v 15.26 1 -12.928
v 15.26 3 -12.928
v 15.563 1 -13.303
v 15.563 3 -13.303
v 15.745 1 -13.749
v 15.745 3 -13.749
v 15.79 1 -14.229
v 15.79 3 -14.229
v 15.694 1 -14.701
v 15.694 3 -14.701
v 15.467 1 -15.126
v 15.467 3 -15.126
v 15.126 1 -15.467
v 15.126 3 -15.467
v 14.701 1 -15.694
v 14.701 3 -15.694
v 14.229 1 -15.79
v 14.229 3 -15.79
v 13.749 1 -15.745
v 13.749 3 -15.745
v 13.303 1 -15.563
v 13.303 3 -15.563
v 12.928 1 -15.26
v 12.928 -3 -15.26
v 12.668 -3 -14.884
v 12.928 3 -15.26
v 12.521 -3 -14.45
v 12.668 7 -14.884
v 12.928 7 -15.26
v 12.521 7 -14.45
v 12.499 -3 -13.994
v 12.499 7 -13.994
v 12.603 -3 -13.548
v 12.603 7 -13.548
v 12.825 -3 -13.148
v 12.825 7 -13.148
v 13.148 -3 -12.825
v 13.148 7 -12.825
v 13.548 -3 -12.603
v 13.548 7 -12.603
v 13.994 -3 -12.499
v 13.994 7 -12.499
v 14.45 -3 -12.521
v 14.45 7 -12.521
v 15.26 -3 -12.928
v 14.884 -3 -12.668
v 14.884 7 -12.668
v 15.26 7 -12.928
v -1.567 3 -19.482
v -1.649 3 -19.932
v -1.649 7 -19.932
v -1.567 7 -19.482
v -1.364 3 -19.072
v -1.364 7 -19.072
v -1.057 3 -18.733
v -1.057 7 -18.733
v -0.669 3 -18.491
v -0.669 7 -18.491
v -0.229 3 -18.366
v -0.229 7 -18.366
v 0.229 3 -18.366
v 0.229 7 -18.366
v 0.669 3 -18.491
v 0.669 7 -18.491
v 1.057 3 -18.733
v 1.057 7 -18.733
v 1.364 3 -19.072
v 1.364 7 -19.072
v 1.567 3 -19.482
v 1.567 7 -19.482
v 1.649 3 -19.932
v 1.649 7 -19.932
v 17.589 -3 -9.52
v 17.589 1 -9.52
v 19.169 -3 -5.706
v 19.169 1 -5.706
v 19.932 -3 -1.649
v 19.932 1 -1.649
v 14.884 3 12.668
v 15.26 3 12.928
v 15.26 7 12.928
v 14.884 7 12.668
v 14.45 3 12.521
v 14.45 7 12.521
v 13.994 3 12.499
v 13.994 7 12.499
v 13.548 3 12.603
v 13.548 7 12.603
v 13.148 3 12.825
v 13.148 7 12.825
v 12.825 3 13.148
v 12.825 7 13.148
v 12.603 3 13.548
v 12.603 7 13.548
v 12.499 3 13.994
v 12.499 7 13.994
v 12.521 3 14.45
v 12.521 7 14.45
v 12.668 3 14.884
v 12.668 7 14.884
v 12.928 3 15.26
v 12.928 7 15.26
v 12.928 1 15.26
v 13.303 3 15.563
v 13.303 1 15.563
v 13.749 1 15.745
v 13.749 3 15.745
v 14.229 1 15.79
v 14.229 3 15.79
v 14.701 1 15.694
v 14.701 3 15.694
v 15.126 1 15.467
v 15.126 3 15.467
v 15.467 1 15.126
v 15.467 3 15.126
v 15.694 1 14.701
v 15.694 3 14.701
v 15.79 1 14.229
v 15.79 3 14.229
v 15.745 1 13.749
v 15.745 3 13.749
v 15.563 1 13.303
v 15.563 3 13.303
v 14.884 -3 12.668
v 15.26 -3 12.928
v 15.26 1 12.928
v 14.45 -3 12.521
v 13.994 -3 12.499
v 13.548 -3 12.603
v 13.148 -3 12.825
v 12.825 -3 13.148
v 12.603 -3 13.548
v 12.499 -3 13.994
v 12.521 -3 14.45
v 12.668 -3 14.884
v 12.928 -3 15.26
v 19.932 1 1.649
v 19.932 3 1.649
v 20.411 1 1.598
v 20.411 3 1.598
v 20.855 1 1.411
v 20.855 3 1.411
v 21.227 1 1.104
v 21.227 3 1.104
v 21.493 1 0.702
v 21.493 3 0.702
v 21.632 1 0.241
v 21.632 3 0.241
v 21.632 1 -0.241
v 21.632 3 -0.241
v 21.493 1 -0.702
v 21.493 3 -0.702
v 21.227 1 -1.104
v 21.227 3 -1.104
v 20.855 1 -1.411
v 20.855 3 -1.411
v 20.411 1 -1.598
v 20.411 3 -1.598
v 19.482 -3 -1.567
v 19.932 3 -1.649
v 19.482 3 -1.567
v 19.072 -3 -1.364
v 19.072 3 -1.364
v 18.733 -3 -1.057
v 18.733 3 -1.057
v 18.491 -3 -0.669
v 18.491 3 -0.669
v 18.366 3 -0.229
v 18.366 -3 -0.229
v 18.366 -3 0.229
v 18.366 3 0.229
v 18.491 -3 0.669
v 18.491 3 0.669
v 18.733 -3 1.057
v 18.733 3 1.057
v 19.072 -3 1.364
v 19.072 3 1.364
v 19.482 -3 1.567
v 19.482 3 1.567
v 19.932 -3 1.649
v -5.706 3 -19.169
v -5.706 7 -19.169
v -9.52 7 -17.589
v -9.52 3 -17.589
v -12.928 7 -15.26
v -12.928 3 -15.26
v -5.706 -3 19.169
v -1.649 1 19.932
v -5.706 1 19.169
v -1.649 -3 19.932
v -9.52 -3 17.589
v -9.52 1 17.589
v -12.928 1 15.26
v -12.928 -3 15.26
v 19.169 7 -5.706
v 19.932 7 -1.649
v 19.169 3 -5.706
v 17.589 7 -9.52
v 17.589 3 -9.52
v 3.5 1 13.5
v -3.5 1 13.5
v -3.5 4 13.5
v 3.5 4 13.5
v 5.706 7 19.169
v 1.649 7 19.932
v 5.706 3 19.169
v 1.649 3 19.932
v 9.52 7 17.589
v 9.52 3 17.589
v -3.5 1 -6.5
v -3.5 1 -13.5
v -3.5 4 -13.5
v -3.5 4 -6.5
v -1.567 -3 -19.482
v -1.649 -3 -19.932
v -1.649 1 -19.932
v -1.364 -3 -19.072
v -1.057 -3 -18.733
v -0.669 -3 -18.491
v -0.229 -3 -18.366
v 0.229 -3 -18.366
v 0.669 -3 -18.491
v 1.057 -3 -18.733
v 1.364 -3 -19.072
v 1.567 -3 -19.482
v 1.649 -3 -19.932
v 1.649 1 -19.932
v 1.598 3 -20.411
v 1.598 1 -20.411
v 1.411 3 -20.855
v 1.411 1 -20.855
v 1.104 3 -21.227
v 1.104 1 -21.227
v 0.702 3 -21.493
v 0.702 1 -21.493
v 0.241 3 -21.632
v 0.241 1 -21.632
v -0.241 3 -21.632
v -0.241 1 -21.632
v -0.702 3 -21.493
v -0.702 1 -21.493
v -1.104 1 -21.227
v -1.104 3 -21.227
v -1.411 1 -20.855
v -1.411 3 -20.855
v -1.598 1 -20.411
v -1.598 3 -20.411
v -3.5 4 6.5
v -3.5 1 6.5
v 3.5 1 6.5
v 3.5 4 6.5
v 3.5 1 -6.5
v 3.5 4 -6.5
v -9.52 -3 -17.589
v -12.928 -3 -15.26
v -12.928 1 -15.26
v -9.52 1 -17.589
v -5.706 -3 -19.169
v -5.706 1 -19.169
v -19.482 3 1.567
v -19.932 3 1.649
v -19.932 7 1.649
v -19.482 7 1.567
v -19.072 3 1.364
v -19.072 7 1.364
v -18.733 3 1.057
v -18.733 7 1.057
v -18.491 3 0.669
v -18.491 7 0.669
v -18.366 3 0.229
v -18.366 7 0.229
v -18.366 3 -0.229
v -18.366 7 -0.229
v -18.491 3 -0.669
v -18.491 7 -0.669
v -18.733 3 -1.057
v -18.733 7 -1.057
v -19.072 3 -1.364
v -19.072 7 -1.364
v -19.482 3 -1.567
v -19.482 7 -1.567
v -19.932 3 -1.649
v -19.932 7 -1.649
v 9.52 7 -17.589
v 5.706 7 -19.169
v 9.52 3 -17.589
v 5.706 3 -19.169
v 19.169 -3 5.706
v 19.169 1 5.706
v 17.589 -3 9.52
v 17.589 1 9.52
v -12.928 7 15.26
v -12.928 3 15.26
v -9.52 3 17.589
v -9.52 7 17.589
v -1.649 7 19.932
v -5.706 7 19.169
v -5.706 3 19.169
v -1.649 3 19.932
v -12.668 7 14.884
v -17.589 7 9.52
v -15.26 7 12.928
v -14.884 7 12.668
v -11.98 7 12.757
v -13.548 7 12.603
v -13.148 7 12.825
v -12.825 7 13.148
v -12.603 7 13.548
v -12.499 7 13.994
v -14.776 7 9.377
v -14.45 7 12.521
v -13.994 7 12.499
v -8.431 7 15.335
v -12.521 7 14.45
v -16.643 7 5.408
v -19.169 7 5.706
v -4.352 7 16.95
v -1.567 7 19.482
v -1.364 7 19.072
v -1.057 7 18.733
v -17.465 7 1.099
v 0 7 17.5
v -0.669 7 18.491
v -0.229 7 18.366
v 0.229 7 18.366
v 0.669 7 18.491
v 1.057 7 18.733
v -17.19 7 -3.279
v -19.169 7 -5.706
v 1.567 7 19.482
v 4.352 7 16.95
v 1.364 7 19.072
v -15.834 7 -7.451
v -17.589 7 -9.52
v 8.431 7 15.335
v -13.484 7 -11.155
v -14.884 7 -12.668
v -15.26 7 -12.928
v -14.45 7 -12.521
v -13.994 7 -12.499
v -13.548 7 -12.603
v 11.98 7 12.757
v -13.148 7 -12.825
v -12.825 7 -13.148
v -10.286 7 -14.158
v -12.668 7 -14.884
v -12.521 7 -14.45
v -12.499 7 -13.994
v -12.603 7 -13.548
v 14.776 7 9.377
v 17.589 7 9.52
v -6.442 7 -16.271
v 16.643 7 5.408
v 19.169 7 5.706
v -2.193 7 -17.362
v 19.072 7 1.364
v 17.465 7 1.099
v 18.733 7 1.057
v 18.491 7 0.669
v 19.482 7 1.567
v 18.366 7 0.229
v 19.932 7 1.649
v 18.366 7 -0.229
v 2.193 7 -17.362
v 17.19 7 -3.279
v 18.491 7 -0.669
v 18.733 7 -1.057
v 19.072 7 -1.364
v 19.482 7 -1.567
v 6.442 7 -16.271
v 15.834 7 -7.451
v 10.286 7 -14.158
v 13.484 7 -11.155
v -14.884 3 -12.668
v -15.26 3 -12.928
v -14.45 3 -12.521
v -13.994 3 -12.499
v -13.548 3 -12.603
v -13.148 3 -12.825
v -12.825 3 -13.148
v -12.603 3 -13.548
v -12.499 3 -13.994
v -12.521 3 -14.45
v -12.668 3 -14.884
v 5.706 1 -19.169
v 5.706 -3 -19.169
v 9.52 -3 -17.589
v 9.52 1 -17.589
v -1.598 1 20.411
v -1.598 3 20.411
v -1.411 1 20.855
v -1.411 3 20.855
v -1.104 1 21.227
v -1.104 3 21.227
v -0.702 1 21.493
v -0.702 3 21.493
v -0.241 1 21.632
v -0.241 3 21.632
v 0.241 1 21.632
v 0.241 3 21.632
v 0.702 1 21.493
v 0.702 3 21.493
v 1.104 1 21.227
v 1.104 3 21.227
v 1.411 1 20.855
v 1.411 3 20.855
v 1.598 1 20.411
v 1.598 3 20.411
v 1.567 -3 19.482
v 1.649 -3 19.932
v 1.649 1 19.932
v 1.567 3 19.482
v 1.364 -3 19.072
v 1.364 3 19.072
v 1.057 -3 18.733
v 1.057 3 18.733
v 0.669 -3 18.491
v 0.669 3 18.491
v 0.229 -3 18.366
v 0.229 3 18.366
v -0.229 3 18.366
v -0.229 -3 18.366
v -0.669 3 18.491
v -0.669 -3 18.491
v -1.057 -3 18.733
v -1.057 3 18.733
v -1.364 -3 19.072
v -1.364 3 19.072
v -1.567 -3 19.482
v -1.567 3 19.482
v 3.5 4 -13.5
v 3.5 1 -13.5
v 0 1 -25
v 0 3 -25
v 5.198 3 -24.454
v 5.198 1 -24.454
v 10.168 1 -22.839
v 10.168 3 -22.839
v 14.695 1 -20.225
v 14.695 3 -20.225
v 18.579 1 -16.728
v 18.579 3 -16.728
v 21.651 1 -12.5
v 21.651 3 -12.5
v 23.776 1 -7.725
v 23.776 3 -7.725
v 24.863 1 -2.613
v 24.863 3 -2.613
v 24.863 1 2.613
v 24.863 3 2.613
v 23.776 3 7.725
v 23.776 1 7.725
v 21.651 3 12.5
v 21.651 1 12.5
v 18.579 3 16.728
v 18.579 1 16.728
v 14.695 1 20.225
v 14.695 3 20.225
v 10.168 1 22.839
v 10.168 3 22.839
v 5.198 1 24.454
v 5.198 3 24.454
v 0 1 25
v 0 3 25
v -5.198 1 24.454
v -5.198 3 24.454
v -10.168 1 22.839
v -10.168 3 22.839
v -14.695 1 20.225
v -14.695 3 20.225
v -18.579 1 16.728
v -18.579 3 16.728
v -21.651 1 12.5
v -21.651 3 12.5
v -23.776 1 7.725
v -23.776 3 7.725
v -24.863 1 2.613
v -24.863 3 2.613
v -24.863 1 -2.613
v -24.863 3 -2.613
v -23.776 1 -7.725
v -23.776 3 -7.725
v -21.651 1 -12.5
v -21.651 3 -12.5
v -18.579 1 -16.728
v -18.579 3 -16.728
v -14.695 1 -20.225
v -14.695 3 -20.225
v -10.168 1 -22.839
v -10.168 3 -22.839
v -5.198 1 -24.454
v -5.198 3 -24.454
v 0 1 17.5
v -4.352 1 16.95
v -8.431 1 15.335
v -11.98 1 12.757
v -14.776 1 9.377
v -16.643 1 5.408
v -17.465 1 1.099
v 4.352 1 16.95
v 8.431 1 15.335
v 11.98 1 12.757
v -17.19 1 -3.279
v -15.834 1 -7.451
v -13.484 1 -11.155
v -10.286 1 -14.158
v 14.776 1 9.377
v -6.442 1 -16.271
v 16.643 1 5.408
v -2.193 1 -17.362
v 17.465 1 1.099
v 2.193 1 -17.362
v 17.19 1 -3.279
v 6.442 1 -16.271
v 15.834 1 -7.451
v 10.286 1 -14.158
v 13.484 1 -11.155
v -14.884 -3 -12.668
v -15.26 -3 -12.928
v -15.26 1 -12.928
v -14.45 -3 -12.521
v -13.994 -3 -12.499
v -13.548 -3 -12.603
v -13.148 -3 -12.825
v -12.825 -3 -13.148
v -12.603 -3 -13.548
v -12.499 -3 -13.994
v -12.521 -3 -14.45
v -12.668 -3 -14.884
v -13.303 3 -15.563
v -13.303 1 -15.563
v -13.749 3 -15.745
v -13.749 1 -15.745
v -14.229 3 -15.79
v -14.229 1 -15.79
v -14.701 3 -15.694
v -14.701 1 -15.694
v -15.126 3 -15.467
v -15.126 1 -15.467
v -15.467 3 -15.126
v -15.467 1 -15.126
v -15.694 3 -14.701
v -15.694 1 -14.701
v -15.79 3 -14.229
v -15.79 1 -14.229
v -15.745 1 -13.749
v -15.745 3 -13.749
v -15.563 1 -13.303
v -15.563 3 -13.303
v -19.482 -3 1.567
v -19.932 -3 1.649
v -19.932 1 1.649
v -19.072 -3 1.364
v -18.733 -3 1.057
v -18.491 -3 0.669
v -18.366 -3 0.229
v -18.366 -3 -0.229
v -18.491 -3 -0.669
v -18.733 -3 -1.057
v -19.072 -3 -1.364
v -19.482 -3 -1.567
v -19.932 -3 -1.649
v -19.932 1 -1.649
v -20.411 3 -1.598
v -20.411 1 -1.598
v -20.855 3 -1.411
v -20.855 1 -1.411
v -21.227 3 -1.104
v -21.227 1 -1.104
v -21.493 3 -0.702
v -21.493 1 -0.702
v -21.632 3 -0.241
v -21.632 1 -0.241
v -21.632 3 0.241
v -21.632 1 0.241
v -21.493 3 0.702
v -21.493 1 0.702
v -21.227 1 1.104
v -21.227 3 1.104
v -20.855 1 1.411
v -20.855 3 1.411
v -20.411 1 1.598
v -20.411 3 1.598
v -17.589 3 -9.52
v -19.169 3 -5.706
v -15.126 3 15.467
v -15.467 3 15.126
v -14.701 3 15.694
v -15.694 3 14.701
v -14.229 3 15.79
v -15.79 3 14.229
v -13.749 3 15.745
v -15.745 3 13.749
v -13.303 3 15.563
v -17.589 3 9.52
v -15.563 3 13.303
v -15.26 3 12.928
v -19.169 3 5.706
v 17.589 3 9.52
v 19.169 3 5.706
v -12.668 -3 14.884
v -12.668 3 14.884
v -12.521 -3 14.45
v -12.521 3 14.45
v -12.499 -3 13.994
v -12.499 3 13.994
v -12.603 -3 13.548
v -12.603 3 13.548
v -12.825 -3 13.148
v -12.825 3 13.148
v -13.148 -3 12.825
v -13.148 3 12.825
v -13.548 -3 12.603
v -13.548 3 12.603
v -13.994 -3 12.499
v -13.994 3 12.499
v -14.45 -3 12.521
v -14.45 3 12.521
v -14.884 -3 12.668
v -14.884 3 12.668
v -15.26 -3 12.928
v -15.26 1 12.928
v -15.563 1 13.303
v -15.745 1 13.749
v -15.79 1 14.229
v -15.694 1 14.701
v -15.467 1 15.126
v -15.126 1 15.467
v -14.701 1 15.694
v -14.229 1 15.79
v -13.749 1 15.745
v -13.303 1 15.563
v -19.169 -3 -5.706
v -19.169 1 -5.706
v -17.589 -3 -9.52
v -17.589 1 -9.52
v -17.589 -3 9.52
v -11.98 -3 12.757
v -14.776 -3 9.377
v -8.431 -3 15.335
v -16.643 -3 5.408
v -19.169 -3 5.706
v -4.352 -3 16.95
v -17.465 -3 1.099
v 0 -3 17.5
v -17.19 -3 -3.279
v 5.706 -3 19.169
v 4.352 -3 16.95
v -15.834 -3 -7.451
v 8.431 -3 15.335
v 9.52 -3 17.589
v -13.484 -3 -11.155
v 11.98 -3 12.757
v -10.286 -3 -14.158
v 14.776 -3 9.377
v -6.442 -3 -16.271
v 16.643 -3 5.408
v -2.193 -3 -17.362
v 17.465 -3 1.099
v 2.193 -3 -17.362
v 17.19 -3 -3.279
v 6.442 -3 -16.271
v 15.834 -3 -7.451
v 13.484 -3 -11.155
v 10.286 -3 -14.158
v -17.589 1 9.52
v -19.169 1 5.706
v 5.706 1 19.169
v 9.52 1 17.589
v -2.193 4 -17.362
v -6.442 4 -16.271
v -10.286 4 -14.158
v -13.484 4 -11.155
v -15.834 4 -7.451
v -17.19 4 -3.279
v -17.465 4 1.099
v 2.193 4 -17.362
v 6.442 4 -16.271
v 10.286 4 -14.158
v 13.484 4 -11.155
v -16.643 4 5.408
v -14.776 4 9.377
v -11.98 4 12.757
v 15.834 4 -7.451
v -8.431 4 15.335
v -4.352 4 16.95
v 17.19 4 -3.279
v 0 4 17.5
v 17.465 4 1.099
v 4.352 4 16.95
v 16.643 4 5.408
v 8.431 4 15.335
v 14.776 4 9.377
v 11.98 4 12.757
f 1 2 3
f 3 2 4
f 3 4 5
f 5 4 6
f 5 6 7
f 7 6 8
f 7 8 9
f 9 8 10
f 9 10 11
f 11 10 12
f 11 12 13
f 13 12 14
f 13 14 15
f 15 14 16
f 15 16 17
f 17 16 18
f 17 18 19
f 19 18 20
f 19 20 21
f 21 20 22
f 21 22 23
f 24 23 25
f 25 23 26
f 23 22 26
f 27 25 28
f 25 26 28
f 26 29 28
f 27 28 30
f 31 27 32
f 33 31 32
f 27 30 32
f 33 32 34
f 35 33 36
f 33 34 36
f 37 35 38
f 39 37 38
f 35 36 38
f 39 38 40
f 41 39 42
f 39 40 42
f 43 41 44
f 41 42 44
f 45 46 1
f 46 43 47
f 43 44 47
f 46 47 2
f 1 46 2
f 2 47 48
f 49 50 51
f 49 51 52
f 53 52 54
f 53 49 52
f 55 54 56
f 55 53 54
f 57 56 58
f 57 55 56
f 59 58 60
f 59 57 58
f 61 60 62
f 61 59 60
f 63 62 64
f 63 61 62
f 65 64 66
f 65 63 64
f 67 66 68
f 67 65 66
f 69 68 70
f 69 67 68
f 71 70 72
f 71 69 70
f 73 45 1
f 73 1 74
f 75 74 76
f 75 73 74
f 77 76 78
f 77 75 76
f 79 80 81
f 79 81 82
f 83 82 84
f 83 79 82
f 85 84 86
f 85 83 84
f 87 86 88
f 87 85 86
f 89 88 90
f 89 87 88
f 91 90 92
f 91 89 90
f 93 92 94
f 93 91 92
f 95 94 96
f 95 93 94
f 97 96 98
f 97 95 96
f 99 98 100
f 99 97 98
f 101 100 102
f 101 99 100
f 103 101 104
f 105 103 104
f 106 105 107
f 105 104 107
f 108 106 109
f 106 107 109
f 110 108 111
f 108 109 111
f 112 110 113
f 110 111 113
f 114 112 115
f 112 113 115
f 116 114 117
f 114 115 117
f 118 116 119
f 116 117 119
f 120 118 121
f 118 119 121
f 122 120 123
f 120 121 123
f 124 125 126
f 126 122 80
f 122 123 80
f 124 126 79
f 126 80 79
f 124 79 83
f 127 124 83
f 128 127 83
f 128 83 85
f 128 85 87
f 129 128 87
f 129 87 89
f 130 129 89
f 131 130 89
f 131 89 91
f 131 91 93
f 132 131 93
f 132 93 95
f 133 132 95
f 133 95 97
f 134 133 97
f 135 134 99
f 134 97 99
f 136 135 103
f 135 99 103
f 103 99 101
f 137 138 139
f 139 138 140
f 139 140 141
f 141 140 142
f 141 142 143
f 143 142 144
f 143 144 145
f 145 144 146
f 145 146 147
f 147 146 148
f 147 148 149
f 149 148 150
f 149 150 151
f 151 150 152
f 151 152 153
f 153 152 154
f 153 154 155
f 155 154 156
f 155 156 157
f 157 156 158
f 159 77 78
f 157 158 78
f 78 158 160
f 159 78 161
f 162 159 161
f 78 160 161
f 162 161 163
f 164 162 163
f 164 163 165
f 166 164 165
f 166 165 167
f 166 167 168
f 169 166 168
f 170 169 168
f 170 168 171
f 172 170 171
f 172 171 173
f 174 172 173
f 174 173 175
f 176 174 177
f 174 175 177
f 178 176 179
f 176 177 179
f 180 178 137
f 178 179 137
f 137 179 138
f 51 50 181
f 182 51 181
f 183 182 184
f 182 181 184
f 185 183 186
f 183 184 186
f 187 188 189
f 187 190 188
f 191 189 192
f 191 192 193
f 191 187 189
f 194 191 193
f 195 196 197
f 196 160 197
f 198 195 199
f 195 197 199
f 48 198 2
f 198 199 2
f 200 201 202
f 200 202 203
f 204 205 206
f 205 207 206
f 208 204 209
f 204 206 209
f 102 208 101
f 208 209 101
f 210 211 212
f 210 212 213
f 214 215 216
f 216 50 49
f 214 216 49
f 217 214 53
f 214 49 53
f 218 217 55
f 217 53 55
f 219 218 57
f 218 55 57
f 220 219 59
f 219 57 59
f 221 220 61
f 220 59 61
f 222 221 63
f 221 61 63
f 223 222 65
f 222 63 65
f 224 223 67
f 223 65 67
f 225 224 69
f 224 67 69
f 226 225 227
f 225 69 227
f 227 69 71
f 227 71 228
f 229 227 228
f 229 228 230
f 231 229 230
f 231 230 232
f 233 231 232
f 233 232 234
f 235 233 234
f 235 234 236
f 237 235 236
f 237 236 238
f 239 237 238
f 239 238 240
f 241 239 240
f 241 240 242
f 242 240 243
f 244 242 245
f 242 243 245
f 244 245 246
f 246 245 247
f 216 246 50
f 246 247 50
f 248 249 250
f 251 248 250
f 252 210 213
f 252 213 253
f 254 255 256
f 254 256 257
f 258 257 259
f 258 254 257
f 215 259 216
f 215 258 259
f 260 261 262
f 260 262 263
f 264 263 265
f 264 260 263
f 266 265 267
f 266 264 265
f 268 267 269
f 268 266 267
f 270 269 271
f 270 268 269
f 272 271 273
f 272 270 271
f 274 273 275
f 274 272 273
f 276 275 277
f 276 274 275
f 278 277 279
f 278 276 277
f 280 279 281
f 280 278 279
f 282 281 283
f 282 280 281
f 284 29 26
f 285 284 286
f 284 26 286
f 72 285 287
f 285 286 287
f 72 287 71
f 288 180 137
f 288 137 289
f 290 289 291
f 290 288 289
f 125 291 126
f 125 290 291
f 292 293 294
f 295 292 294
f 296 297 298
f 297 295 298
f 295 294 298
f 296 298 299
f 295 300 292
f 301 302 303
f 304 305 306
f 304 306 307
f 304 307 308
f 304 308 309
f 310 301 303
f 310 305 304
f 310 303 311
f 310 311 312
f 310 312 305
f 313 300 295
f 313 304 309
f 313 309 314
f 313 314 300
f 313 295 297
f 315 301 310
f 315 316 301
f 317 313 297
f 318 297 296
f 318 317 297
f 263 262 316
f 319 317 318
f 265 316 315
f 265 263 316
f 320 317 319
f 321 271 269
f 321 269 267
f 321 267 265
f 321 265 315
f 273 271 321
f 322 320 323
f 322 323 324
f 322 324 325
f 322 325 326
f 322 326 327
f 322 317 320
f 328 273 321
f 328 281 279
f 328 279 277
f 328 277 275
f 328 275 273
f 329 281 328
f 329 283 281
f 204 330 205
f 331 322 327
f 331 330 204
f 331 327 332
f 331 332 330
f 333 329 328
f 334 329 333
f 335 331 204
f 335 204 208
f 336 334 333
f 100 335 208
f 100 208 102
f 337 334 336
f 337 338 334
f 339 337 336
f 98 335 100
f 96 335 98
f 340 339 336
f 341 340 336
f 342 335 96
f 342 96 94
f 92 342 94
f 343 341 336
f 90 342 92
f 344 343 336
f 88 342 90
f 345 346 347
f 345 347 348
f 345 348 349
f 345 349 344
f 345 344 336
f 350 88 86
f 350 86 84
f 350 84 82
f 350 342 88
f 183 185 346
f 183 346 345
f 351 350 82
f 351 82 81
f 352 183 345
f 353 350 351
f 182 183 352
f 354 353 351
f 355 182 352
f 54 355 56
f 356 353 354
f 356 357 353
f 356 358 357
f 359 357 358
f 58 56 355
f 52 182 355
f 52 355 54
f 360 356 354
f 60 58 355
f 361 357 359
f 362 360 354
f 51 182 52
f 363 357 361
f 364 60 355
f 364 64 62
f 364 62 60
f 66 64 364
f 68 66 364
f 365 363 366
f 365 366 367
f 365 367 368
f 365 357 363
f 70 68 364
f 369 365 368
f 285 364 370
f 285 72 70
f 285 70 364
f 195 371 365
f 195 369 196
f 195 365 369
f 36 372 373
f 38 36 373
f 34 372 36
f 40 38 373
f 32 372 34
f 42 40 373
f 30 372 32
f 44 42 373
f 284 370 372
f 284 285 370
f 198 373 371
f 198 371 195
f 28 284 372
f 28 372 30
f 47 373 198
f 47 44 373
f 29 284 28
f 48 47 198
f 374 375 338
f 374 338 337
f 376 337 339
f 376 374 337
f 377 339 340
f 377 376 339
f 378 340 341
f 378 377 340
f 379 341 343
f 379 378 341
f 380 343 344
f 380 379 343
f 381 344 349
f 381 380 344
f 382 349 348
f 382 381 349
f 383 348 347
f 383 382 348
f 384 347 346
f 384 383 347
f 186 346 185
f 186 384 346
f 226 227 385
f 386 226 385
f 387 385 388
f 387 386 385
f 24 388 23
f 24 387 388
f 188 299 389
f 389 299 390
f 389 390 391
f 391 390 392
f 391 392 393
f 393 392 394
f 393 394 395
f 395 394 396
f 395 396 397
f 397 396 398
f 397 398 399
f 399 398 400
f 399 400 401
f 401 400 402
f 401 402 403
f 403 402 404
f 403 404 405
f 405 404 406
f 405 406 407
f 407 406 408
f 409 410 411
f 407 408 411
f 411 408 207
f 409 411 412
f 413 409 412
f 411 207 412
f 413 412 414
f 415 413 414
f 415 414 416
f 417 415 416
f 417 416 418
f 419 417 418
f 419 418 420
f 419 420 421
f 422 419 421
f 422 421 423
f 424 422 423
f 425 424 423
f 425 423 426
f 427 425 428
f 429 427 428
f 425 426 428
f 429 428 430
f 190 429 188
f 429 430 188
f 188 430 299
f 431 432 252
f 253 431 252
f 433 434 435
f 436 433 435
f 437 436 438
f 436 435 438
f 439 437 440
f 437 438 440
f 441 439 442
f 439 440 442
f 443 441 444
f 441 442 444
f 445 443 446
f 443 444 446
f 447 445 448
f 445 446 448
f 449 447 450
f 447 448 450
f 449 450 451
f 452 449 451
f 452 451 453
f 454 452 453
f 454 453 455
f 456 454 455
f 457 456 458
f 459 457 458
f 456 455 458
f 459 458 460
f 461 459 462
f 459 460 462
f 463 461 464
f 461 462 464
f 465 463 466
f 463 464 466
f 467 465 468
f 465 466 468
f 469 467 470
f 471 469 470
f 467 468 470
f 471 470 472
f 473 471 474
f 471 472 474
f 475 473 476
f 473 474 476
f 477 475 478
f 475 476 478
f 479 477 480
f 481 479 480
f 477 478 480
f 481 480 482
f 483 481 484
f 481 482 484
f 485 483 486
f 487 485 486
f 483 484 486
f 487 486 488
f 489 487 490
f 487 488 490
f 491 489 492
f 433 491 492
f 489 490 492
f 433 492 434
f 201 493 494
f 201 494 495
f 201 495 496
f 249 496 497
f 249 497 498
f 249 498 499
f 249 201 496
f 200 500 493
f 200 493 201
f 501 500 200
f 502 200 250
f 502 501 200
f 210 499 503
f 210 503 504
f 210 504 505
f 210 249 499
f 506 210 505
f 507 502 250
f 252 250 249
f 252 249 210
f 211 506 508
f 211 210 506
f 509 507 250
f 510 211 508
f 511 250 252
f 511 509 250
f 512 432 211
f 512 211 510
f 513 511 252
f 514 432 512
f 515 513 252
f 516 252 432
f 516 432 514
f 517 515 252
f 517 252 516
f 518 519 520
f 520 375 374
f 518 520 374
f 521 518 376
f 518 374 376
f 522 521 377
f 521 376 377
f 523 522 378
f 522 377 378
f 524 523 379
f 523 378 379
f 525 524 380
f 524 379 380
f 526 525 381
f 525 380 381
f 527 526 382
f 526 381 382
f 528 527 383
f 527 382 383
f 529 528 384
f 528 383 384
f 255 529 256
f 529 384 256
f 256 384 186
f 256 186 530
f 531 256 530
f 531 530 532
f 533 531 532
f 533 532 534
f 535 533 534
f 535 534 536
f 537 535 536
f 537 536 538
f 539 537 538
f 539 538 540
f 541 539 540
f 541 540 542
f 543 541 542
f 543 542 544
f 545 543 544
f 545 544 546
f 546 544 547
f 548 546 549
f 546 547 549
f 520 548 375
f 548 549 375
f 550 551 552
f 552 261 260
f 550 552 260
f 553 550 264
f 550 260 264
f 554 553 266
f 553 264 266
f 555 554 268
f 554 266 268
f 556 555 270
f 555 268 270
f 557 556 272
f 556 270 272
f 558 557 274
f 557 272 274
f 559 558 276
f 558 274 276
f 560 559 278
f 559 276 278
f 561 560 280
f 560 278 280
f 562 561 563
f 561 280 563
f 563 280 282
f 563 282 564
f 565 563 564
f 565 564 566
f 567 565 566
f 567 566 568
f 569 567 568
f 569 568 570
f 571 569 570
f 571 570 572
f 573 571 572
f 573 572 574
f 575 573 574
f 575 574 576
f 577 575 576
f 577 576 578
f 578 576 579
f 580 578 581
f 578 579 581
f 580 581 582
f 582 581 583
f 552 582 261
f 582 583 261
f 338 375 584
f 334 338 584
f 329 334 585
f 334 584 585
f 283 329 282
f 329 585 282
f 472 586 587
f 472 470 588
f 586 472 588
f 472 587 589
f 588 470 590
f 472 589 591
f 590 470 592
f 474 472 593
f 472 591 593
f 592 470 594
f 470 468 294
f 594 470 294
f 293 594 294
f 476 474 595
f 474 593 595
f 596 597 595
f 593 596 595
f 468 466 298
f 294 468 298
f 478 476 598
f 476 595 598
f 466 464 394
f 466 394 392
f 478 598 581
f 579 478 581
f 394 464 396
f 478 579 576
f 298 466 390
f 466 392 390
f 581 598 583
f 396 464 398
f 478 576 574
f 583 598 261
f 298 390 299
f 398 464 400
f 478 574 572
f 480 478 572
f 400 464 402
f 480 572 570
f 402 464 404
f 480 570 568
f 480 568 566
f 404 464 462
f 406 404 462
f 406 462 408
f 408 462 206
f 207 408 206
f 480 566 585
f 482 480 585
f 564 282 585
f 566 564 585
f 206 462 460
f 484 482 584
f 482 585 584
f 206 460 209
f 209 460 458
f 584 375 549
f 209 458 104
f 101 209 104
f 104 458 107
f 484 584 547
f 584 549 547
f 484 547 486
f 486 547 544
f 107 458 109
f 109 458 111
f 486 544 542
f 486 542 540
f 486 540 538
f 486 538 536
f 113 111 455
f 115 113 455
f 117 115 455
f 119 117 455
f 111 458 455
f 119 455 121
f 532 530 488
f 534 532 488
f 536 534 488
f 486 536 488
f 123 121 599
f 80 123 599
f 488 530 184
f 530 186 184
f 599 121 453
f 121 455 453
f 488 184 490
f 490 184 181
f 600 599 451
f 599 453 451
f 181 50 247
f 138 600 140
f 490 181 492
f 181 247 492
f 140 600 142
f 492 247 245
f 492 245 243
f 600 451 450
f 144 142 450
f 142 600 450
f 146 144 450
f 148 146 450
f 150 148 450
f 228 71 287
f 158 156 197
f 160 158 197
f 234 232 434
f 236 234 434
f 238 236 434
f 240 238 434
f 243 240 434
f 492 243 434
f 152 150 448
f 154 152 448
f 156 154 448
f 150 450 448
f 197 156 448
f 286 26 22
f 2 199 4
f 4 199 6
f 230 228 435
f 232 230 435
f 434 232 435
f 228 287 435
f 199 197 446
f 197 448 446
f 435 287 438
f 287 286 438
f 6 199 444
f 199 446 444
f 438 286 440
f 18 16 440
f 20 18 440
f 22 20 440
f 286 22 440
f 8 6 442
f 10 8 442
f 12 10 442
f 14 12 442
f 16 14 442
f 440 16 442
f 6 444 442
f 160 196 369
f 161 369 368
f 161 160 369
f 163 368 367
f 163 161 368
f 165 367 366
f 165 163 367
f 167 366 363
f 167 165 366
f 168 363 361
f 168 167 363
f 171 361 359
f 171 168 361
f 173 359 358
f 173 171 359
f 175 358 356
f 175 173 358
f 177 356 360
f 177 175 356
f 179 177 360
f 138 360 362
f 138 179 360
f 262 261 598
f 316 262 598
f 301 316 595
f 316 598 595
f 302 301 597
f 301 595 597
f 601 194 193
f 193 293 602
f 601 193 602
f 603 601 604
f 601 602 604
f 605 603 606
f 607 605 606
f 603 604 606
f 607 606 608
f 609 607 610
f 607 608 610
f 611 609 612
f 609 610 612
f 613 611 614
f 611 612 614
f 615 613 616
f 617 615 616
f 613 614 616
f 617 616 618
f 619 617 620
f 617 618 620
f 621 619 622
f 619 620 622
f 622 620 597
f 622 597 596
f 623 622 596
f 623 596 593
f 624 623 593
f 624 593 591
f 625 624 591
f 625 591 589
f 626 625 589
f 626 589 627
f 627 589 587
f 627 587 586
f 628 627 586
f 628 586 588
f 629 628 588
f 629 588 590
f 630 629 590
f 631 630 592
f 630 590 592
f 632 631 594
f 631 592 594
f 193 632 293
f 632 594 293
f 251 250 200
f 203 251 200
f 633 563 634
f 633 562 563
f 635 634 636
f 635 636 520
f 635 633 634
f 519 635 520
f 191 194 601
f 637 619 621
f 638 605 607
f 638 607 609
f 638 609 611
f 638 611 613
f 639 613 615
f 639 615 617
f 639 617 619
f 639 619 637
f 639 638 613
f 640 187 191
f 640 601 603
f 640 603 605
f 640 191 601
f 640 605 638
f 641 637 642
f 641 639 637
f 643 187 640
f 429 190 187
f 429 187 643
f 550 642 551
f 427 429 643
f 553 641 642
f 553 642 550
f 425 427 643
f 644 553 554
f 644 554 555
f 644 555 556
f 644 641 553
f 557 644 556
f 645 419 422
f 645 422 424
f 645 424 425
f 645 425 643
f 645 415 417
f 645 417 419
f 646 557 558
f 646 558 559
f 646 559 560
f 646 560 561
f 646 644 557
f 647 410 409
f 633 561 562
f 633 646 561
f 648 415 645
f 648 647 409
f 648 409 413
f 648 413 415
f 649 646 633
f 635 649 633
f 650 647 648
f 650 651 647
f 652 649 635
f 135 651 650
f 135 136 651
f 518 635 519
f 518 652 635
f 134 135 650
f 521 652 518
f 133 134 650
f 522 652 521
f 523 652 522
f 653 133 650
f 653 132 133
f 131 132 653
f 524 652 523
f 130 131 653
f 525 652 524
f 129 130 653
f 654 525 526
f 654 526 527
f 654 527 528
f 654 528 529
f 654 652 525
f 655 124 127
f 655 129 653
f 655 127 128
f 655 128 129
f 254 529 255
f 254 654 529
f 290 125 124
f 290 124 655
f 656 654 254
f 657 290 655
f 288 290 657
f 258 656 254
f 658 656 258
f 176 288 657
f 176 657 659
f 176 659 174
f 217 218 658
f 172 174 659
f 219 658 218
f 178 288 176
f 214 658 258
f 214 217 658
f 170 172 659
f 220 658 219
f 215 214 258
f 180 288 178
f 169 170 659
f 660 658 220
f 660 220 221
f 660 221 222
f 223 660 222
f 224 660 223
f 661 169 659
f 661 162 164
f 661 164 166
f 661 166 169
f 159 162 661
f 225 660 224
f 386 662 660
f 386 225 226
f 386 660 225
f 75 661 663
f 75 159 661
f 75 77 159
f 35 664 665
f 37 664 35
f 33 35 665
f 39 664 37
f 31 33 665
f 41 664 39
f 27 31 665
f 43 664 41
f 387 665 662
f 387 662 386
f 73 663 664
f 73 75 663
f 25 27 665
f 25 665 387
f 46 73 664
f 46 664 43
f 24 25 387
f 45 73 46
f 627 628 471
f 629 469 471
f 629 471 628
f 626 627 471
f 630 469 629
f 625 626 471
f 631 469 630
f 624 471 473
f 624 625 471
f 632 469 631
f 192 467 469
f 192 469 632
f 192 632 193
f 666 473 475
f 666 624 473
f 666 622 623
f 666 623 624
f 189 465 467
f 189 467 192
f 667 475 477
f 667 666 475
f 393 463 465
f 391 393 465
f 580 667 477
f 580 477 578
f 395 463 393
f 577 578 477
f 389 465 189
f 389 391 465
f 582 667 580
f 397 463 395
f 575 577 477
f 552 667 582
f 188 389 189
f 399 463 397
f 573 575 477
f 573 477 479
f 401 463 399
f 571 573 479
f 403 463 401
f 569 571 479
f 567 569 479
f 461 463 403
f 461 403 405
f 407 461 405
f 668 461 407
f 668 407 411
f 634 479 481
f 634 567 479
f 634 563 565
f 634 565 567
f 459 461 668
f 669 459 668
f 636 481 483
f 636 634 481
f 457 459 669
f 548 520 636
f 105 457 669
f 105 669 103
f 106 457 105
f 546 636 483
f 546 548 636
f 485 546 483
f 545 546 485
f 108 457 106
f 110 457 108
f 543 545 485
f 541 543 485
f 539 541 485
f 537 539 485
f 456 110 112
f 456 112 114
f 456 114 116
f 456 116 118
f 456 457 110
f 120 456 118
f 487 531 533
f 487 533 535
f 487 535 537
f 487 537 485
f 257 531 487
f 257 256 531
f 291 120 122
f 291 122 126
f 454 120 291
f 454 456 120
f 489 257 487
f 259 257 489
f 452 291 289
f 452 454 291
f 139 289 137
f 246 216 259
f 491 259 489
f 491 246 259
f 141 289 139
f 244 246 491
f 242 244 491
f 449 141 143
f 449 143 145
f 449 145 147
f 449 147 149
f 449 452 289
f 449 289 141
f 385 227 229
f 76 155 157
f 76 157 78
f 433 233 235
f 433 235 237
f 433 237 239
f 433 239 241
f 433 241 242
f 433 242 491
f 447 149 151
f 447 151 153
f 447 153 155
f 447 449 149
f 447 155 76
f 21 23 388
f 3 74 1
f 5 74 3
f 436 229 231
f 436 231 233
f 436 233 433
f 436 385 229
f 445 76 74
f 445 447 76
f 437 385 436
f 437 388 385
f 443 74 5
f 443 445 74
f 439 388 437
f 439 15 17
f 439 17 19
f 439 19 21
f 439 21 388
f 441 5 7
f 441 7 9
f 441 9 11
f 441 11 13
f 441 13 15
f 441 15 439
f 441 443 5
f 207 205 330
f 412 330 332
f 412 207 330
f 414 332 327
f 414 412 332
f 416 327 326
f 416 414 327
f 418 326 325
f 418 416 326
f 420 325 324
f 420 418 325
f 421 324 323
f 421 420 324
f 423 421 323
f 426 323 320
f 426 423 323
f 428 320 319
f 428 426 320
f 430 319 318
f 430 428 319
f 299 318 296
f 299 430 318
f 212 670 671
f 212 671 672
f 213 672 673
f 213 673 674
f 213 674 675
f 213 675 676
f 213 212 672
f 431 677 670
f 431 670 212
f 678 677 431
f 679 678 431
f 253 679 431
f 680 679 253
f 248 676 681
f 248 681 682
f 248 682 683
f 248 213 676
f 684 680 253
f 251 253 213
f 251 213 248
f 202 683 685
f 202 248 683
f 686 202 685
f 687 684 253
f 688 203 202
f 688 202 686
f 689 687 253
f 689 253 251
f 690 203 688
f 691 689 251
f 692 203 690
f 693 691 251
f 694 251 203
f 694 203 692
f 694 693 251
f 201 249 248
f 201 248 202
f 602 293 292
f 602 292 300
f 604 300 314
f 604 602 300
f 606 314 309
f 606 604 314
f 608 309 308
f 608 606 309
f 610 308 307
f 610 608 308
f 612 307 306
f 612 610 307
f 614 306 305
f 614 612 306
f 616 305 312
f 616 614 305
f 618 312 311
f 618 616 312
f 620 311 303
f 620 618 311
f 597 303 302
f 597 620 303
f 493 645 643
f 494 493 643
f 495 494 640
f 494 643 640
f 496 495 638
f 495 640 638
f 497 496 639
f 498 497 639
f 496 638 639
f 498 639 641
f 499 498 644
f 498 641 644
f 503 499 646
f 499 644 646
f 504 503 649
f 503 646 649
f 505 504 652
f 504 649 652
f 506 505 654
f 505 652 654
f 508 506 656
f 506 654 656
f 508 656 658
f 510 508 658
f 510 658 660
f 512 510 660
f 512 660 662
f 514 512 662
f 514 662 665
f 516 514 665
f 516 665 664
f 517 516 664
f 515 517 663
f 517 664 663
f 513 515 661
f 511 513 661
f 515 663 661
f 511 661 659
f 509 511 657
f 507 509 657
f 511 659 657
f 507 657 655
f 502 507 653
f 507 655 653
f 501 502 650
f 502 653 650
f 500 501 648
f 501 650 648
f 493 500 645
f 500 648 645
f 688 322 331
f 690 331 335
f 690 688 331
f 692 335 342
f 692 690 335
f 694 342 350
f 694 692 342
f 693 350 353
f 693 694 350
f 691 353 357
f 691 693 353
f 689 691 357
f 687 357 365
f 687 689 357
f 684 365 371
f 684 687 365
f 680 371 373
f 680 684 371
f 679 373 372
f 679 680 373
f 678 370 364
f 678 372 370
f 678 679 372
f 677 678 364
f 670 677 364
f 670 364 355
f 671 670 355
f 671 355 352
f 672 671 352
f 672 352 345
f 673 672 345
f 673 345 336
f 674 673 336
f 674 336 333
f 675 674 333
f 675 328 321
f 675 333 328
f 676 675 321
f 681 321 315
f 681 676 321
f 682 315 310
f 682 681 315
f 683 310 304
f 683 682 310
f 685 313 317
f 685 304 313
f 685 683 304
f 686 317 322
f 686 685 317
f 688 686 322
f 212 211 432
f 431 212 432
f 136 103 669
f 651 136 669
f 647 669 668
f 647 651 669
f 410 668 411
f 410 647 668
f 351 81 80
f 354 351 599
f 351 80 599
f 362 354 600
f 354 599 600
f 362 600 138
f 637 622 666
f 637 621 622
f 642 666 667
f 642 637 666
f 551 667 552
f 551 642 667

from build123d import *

# Parameters (mm, degrees)
SKETCH1_R           = 20
BOSS_EXTRUDE1_DEPTH = 4
SKETCH2_R           = 20
SKETCH2_R_2         = 17.5
BOSS_EXTRUDE2_DEPTH = 4
SKETCH3_R           = 20
CUT_EXTRUDE1_DEPTH  = 2
SKETCH4_R           = 20
CUT_EXTRUDE2_DEPTH  = 1
SKETCH5_R           = 25
BOSS_EXTRUDE3_DEPTH = 2
BOSS_EXTRUDE4_START = 4
SKETCH6_R           = 20
SKETCH6_R_2         = 17.5
BOSS_EXTRUDE4_DEPTH = 4
SKETCH7_R           = 1.5
CUT_EXTRUDE3_DEPTH  = 16
SKETCH8_W           = 7
SKETCH8_H           = 7
CUT_EXTRUDE4_DEPTH  = 2
SKETCH9_W           = 7
SKETCH9_H           = 7
CUT_EXTRUDE5_DEPTH  = 2
SKETCH10_W          = 7
SKETCH10_H          = 7
CUT_EXTRUDE6_DEPTH  = 2
SKETCH11_R          = 24.253678372
CUT_EXTRUDE7_DEPTH  = 1
SKETCH12_R          = 1.65
CUT_EXTRUDE8_DEPTH  = 10


with BuildPart() as part:
    # Sketch1 → Boss-Extrude1 (new body)
    with BuildSketch(Plane(origin=(0, 0, 0), x_dir=(1, 0, 0), z_dir=(0, 1, 0))):
        with Locations(Location((0, 0, 0), (0, 0, 270))):
            Circle(SKETCH1_R)
    extrude(amount=BOSS_EXTRUDE1_DEPTH)

    # Sketch2 → Boss-Extrude2 (add)
    with BuildSketch(Plane(origin=(0, 4, 0), x_dir=(1, 0, 0), z_dir=(0, 1, 0))):
        with Locations(Location((0, 0, 0), (0, 0, 270))):
            Circle(SKETCH2_R)
        with Locations(Location((0, 0, 0), (0, 0, 270))):
            Circle(SKETCH2_R_2, mode=Mode.SUBTRACT)
    extrude(amount=BOSS_EXTRUDE2_DEPTH)

    # Sketch3 → Cut-Extrude1 (cut)
    with BuildSketch(Plane.XZ):
        with Locations(Location((0, 0, 0), (0, 0, 270))):
            Circle(SKETCH3_R)
    extrude(amount=-CUT_EXTRUDE1_DEPTH, mode=Mode.SUBTRACT)

    # Sketch4 → Cut-Extrude2 (cut)
    with BuildSketch(Plane(origin=(0, 2, 0), x_dir=(-1, 0, 0), z_dir=(0, -1, 0))):
        with Locations(Location((0, 0, 0), (0, 0, 90))):
            Circle(SKETCH4_R)
    extrude(amount=-CUT_EXTRUDE2_DEPTH, mode=Mode.SUBTRACT)

    # Sketch5 → Boss-Extrude3 (add)
    with BuildSketch(Plane.XZ.offset(-3)):
        with Locations(Location((0, 0, 0), (0, 0, 270))):
            Circle(SKETCH5_R)
    extrude(amount=BOSS_EXTRUDE3_DEPTH)

    # Sketch6 → Boss-Extrude4 (add)
    with BuildSketch(Plane.XZ.offset(-1).offset(BOSS_EXTRUDE4_START)):
        with Locations(Location((0, 0, 0), (0, 0, 270))):
            Circle(SKETCH6_R)
        with Locations(Location((0, 0, 0), (0, 0, 90))):
            Circle(SKETCH6_R_2, mode=Mode.SUBTRACT)
    extrude(amount=-BOSS_EXTRUDE4_DEPTH)

    # Sketch7 → Cut-Extrude3 (cut)
    with BuildSketch(Plane.XZ.offset(3)):
        with Locations(Location((-20, 0, 0), (0, 0, 272.149095627))):
            Circle(SKETCH7_R)
        with Locations(Location((-14.142135624, 14.142135624, 0), (0, 0, 227.149095627))):
            Circle(SKETCH7_R)
        with Locations(Location((0, 20, 0), (0, 0, 182.149095627))):
            Circle(SKETCH7_R)
        with Locations(Location((14.142135624, 14.142135624, 0), (0, 0, 312.850904373))):
            Circle(SKETCH7_R)
        with Locations(Location((20, 0, 0), (0, 0, 267.850904373))):
            Circle(SKETCH7_R)
        with Locations(Location((14.142135624, -14.142135624, 0), (0, 0, 222.850904373))):
            Circle(SKETCH7_R)
        with Locations(Location((0, -20, 0), (0, 0, 177.850904373))):
            Circle(SKETCH7_R)
        with Locations(Location((-14.142135624, -14.142135624, 0), (0, 0, 317.149095627))):
            Circle(SKETCH7_R)
    extrude(amount=-CUT_EXTRUDE3_DEPTH, mode=Mode.SUBTRACT)

    # Sketch8 → Cut-Extrude4 (cut)
    with BuildSketch(Plane.XZ.offset(-1)):
        with Locations((0, 10)):
            Rectangle(SKETCH8_W, SKETCH8_H)
        with Locations((0, -10)):
            Rectangle(SKETCH8_W, SKETCH8_H)
    extrude(amount=-CUT_EXTRUDE4_DEPTH, mode=Mode.SUBTRACT)

    # Sketch9 → Cut-Extrude5 (cut)
    with BuildSketch(Plane.XZ.offset(-3)):
        with Locations((0, -10)):
            Rectangle(SKETCH9_W, SKETCH9_H)
    extrude(amount=-CUT_EXTRUDE5_DEPTH, mode=Mode.SUBTRACT)

    # Sketch10 → Cut-Extrude6 (cut)
    with BuildSketch(Plane.XZ.offset(-3)):
        with Locations((0, 10)):
            Rectangle(SKETCH10_W, SKETCH10_H)
    extrude(amount=-CUT_EXTRUDE6_DEPTH, mode=Mode.SUBTRACT)

    # Sketch11 → Cut-Extrude7 (cut)
    with BuildSketch(Plane(origin=(0, 8, 0), x_dir=(1, 0, 0), z_dir=(0, 1, 0))):
        Circle(SKETCH11_R)
    extrude(amount=-CUT_EXTRUDE7_DEPTH, mode=Mode.SUBTRACT)

    # Sketch12 → Cut-Extrude8 (cut, symmetric)
    with BuildSketch(Plane(origin=(0, 3, 0), x_dir=(1, 0, 0), z_dir=(0, 1, 0))):
        with Locations(Location((20, 0, 0), (0, 0, 267.635878321))):
            Circle(SKETCH12_R)
        with Locations(Location((14.142135624, -14.142135624, 0), (0, 0, 222.635878321))):
            Circle(SKETCH12_R)
        with Locations(Location((0, -20, 0), (0, 0, 177.635878321))):
            Circle(SKETCH12_R)
        with Locations(Location((-14.142135624, -14.142135624, 0), (0, 0, 317.364121679))):
            Circle(SKETCH12_R)
        with Locations(Location((-20, 0, 0), (0, 0, 272.364121679))):
            Circle(SKETCH12_R)
        with Locations(Location((-14.142135624, 14.142135624, 0), (0, 0, 227.364121679))):
            Circle(SKETCH12_R)
        with Locations(Location((0, 20, 0), (0, 0, 182.364121679))):
            Circle(SKETCH12_R)
        with Locations(Location((14.142135624, 14.142135624, 0), (0, 0, 312.635878321))):
            Circle(SKETCH12_R)
    extrude(amount=CUT_EXTRUDE8_DEPTH, both=True, mode=Mode.SUBTRACT)


solid = part.part
